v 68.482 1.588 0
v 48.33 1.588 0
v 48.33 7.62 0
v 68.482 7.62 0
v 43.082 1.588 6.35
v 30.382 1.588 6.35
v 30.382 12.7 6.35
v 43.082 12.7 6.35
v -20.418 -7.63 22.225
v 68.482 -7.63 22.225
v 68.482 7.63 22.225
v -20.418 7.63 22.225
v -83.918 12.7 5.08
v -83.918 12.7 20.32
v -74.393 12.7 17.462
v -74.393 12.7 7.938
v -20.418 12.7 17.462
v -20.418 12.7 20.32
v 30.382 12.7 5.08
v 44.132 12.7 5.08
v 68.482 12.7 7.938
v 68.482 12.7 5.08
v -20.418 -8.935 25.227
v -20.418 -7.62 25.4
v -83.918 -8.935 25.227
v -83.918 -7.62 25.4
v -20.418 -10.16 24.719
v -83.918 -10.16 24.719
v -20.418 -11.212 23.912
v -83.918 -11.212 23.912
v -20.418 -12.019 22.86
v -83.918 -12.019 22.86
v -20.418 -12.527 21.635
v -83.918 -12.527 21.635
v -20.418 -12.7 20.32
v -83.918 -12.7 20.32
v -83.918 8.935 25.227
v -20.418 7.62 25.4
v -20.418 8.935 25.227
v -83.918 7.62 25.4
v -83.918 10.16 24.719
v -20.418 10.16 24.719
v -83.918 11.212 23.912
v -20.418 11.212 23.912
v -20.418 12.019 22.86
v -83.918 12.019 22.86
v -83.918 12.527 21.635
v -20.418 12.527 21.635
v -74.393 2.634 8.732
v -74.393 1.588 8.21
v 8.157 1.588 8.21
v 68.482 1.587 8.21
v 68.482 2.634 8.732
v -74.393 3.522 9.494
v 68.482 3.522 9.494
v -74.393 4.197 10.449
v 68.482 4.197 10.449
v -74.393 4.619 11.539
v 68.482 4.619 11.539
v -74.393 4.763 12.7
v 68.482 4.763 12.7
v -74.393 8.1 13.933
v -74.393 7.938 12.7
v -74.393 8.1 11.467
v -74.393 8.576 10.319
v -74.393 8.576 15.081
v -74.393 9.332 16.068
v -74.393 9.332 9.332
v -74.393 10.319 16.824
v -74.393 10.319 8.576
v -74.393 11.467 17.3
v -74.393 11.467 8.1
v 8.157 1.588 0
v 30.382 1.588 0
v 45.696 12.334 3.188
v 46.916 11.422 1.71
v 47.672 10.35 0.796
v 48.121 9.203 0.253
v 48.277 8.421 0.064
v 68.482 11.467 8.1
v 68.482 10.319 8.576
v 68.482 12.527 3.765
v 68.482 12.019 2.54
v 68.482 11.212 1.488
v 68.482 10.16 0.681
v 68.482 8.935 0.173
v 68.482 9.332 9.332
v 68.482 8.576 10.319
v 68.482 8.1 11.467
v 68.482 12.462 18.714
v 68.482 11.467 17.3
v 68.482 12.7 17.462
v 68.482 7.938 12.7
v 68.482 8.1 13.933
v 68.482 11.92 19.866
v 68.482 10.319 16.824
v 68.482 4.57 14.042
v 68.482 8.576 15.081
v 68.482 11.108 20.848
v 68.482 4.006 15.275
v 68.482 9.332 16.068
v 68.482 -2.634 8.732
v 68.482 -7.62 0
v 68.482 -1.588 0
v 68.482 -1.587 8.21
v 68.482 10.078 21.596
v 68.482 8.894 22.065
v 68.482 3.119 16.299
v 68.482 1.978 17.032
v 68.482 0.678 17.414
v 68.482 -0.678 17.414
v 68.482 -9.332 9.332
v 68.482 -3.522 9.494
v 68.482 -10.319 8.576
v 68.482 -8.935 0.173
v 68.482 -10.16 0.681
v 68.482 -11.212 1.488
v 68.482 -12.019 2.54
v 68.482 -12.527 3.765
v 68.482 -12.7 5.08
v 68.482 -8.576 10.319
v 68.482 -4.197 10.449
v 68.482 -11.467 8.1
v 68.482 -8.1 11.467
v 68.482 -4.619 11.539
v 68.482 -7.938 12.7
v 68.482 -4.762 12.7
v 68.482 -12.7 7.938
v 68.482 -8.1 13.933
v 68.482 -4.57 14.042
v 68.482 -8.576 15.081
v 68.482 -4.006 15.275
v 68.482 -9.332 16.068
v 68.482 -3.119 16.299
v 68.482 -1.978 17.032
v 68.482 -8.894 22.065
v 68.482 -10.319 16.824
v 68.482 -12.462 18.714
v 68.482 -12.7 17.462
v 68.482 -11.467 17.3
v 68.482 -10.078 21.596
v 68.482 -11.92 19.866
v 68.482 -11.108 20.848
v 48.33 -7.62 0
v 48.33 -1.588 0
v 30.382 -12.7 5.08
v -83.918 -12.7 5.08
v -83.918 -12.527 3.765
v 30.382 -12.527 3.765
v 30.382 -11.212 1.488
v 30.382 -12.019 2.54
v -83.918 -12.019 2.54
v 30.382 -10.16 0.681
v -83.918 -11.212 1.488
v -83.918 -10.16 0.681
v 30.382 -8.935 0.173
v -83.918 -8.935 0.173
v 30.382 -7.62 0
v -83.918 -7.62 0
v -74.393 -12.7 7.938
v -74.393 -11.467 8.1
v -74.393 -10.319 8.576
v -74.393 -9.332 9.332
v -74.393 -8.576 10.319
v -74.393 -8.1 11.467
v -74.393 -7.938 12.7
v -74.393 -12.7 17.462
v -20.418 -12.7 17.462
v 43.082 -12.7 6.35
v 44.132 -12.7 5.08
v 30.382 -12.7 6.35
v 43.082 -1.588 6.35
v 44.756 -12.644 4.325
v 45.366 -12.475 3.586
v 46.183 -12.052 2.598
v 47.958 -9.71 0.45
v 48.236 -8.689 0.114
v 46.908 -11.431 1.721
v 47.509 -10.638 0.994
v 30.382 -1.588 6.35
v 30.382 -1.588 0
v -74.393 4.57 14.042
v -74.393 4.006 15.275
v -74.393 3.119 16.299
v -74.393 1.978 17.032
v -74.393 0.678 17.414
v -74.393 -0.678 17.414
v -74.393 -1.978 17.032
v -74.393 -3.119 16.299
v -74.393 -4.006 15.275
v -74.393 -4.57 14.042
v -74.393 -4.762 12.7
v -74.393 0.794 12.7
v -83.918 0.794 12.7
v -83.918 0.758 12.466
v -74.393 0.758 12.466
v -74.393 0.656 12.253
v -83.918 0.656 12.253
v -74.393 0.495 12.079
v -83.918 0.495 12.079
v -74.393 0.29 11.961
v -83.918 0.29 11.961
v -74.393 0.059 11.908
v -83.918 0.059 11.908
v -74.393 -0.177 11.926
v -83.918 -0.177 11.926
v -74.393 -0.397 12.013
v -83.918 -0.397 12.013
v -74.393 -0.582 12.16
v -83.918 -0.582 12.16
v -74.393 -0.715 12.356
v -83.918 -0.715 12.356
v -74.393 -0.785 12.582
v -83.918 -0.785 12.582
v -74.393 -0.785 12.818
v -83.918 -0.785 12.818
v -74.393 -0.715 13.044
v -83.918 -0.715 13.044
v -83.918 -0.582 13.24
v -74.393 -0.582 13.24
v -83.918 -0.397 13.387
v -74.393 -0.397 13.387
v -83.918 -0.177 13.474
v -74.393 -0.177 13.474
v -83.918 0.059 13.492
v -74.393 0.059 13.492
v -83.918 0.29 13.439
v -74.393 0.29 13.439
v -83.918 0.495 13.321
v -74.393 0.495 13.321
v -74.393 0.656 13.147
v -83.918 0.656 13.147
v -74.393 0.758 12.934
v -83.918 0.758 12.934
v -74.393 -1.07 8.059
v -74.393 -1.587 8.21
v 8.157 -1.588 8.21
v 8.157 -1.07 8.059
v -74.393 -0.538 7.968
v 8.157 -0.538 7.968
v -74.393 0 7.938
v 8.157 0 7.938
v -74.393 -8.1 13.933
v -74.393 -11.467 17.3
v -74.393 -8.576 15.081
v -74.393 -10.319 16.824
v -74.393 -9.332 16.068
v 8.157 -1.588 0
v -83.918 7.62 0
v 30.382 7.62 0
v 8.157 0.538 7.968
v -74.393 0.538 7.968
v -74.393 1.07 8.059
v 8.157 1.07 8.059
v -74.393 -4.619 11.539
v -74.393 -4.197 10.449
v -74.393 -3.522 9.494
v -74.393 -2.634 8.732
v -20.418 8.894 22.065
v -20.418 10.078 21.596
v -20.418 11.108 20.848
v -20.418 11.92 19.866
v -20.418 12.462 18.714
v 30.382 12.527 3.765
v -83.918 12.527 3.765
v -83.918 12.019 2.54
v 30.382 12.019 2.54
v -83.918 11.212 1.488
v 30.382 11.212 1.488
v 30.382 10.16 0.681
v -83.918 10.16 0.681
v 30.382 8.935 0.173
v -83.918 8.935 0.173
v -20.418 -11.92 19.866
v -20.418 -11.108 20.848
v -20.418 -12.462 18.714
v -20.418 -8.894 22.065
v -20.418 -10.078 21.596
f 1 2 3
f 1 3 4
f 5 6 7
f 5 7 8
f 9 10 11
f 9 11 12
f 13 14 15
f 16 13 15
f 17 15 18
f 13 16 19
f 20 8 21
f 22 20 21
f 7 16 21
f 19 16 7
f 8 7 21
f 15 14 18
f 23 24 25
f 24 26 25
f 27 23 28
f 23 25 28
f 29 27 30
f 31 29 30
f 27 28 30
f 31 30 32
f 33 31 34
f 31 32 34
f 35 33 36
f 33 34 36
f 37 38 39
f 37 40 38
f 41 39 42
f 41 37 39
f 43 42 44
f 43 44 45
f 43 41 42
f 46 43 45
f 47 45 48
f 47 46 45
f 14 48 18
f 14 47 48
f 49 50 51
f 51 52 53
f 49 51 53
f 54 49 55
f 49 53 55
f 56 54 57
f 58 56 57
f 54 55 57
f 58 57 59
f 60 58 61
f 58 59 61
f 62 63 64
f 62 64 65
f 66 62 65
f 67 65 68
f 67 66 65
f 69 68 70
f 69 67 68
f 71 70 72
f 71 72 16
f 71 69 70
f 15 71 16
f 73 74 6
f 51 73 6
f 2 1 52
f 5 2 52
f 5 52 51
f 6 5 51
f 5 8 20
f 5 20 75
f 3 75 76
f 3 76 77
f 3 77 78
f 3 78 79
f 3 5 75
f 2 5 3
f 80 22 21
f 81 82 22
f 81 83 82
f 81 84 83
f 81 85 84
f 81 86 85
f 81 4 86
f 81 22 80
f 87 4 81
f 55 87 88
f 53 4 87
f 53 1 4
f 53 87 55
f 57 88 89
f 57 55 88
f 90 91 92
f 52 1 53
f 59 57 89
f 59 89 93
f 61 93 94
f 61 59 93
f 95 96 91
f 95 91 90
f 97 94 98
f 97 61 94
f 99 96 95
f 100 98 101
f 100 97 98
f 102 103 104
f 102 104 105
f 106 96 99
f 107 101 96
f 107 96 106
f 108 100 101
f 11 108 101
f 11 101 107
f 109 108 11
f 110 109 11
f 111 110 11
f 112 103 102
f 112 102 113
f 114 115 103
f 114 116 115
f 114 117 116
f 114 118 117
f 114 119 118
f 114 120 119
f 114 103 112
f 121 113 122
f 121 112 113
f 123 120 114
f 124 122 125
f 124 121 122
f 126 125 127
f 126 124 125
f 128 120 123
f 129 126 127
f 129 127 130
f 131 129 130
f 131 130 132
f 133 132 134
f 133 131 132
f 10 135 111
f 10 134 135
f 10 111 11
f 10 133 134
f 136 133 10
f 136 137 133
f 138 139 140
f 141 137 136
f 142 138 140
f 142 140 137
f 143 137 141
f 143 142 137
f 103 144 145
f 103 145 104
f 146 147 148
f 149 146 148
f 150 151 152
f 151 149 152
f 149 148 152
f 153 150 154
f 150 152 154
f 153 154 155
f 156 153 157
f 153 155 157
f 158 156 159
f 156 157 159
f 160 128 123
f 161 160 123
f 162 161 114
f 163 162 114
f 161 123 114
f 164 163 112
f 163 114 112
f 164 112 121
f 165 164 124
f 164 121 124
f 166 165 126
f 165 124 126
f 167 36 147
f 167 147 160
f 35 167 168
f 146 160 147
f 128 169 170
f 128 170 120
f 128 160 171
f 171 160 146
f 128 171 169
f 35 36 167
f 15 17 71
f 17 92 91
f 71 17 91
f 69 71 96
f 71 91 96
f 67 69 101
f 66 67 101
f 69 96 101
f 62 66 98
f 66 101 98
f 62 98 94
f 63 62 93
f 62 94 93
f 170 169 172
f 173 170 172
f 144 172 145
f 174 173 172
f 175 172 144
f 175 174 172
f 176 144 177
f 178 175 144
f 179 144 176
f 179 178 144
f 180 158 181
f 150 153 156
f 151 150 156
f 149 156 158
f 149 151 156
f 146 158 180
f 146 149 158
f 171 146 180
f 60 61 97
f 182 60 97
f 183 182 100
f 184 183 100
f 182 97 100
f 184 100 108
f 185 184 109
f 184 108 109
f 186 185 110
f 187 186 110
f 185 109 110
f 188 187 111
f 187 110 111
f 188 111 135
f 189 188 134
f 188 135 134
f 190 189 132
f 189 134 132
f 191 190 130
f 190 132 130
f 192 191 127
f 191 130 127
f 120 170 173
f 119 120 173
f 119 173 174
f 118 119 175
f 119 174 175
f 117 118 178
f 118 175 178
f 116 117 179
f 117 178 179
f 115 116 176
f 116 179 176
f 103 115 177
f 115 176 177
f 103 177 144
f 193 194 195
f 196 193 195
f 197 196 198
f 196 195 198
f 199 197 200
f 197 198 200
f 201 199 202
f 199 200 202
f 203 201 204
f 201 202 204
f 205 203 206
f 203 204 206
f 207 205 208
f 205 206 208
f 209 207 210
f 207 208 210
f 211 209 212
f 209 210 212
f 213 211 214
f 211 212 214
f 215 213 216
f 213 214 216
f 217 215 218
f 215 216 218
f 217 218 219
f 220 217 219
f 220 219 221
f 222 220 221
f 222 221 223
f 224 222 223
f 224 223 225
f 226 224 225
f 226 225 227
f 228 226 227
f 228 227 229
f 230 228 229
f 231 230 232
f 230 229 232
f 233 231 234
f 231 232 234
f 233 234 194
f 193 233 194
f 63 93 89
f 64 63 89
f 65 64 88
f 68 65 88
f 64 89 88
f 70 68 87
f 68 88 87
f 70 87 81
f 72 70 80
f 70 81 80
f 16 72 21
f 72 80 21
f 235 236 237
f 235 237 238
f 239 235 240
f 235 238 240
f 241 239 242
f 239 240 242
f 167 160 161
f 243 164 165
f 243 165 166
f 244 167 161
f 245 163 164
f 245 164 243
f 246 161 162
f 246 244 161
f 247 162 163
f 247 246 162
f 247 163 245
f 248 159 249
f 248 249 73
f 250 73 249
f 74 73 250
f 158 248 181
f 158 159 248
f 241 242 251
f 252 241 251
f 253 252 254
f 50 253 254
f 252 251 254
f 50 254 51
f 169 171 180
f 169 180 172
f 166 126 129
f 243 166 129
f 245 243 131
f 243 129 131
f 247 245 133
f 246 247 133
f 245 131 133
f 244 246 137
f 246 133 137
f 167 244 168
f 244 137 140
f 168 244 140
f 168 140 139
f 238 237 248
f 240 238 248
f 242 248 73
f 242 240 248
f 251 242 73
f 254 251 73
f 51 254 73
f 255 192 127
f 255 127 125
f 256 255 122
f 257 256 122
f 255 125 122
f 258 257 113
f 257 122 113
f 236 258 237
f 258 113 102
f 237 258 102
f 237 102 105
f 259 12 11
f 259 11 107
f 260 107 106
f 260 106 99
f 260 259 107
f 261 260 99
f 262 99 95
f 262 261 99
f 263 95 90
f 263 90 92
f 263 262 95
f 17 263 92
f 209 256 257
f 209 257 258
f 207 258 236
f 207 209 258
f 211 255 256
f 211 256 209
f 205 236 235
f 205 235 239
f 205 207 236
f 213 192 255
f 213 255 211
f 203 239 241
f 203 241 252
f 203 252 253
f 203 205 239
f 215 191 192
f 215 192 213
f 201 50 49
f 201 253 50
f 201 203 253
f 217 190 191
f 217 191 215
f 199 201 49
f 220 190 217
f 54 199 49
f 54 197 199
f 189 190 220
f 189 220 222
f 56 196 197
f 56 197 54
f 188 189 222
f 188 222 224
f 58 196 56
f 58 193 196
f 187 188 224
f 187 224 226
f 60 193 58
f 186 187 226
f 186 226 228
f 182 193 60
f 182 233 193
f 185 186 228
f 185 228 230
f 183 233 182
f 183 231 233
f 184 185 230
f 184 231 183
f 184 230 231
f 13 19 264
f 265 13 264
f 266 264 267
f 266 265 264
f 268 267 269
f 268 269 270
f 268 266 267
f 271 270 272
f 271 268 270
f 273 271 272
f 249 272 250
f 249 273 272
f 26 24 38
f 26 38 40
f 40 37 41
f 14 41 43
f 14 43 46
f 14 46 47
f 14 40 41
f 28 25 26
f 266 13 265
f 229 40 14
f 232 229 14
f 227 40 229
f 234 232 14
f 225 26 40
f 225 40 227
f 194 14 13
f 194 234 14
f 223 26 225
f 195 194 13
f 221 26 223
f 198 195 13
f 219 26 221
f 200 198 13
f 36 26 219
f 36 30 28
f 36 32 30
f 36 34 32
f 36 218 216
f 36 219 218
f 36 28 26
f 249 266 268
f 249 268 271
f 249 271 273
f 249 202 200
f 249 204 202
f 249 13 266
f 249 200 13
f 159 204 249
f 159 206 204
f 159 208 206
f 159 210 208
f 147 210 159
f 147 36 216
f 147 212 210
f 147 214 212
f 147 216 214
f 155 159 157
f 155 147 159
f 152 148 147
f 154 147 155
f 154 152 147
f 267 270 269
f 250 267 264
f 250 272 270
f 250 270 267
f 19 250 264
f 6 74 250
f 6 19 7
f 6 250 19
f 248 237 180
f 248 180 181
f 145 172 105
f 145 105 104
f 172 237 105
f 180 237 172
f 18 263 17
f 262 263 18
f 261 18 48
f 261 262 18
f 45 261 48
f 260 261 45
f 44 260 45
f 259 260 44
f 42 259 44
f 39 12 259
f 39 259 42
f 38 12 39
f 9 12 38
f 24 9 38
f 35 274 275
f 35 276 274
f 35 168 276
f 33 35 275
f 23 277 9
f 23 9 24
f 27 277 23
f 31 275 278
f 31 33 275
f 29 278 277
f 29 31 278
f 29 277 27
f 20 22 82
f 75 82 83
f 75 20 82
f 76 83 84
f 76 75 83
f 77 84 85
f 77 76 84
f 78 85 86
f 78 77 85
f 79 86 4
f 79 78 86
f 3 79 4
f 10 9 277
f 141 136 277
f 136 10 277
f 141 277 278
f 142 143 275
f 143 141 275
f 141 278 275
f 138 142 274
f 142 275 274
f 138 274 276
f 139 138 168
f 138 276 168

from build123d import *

# Parameters (mm, degrees)
F0_W        = 142.875
F0_H        = 9.525
F1_DEPTH    = 12.7
F3_DEPTH    = 142.875
F5_DEPTH    = 9.525
F6_DEPTH    = 142.875
F7_T1_DEPTH = 101.5751710417
F7_T3_DEPTH = 45.552419836
F7_T5_DEPTH = 139.7
F8_R        = 5.08
F9_DEPTH    = 60.325


# Not quite as in the source:
# - a fillet or chamfer that OpenCascade refuses, or shapes differently, is made with other operations: its cross-section is extruded or revolved along the edge and cut away or added


with BuildPart() as f1:
    # F0 (on Front) → F1 (new body, symmetric)
    with BuildSketch(Plane.XZ):
        Polygon((-20.4177256674, 25.4), (-83.9177256674, 25.4), (-83.9177256674, 0), (30.3822743326, 0), (30.3822743326, 6.35), (43.0822743326, 6.35), (48.3298544966, 0), (68.4822743326, 0), (68.4822743326, 7.9375), (-74.3927256674, 7.9375), (-74.3927256674, 17.4625), (68.4822743326, 17.4625), (68.4822743326, 22.225), (-20.4177256674, 22.225), align=None)
        with Locations((-2.9552256674, 12.7)):
            Rectangle(F0_W, F0_H)
    extrude(amount=F1_DEPTH, both=True)

    # F2 (on face) → F3 (cut)
    with BuildSketch(Plane.YZ.offset(68.4822743326)):
        with BuildLine():
            Line((-4.7625, 12.7), (0, 12.7))
            Line((0, 12.7), (4.7625, 12.7))
            ThreePointArc((4.7625, 12.7), (0, 17.4625), (-4.7625, 12.7))
        make_face()
        with BuildLine():
            Line((-1.5875, 8.2098719395), (0, 8.2098719395))
            Line((0, 8.2098719395), (0, 12.7))
            Line((0, 12.7), (-4.7625, 12.7))
            ThreePointArc((-4.7625, 12.7), (-3.8885649667, 9.950369343), (-1.5875, 8.2098719395))
        make_face()
        with BuildLine():
            ThreePointArc((-1.5875, 8.2098719395), (-0.8053481737, 8.0060868597), (0, 7.9375))
            Line((0, 7.9375), (0, 8.2098719395))
            Line((0, 8.2098719395), (-1.5875, 8.2098719395))
        make_face()
        with BuildLine():
            Line((0, 8.2098719395), (0, 7.9375))
            ThreePointArc((0, 7.9375), (0.8053481737, 8.0060868597), (1.5875, 8.2098719395))
            Line((1.5875, 8.2098719395), (0, 8.2098719395))
        make_face()
        with BuildLine():
            Line((0, 12.7), (0, 8.2098719395))
            Line((0, 8.2098719395), (1.5875, 8.2098719395))
            ThreePointArc((1.5875, 8.2098719395), (3.8885649667, 9.950369343), (4.7625, 12.7))
            Line((4.7625, 12.7), (0, 12.7))
        make_face()
    extrude(amount=-F3_DEPTH, mode=Mode.SUBTRACT)

    # F4 (on face) → F5 (cut)
    with BuildSketch(Plane(origin=(-83.9177256674, 0, 0), x_dir=(0, -1, 0), z_dir=(-1, 0, 0))):
        with BuildLine():
            Line((-0.79375, 12.7), (0.79375, 12.7))
            ThreePointArc((0.79375, 12.7), (0, 13.49375), (-0.79375, 12.7))
        make_face()
        with BuildLine():
            ThreePointArc((-0.79375, 12.7), (0, 11.90625), (0.79375, 12.7))
            Line((0.79375, 12.7), (-0.79375, 12.7))
        make_face()
    extrude(amount=-F5_DEPTH, mode=Mode.SUBTRACT)

    # F2 (on face) → F6 (cut)
    with BuildSketch(Plane.YZ.offset(68.4822743326)):
        with BuildLine():
            ThreePointArc((12.7, 17.4625), (9.3324039546, 16.0675960454), (7.9375, 12.7))
            Line((7.9375, 12.7), (12.7, 12.7))
            Line((12.7, 12.7), (12.7, 17.4625))
        make_face()
        with BuildLine():
            ThreePointArc((7.9375, 12.7), (9.3324039546, 9.3324039546), (12.7, 7.9375))
            Line((12.7, 7.9375), (12.7, 12.7))
            Line((12.7, 12.7), (7.9375, 12.7))
        make_face()
        with BuildLine():
            Line((-12.7, 12.7), (-12.7, 7.9375))
            ThreePointArc((-12.7, 7.9375), (-9.3324039546, 9.3324039546), (-7.9375, 12.7))
            Line((-7.9375, 12.7), (-12.7, 12.7))
        make_face()
        with BuildLine():
            Line((-12.7, 12.7), (-7.9375, 12.7))
            ThreePointArc((-7.9375, 12.7), (-9.3324039546, 16.0675960454), (-12.7, 17.4625))
            Line((-12.7, 17.4625), (-12.7, 12.7))
        make_face()
    extrude(amount=-F6_DEPTH, mode=Mode.SUBTRACT)

    # F7: fillet of radius 5.08 on 6 edges, made by hand

    # F7_s2 → F7_t1 (cut)
    with BuildSketch(Plane.YZ.offset(-20.4177256674)):
        with BuildLine():
            ThreePointArc((7.6299315833, 22.225), (11.1079698235, 20.8476544532), (12.7, 17.4625))
            Line((12.7, 17.4625), (12.7, 22.225))
            Line((12.7, 22.225), (7.6299315833, 22.225))
        make_face()
        with BuildLine():
            ThreePointArc((-7.6299315833, 22.225), (-11.1079698235, 20.8476544532), (-12.7, 17.4625))
            Line((-12.7, 17.4625), (-12.7, 22.225))
            Line((-12.7, 22.225), (-7.6299315833, 22.225))
        make_face()
    extrude(amount=F7_T1_DEPTH, mode=Mode.SUBTRACT)

    # F7_s4 → F7_t3 (cut)
    with BuildSketch(Plane.YZ.offset(35.6298544966)):
        with BuildLine():
            ThreePointArc((12.7, 5.08), (11.2121024484, 1.4878975516), (7.62, 0))
            Line((7.62, 0), (12.7, 0))
            Line((12.7, 0), (12.7, 5.08))
        make_face()
        with BuildLine():
            ThreePointArc((-12.7, 5.08), (-11.2121024484, 1.4878975516), (-7.62, 0))
            Line((-7.62, 0), (-12.7, 0))
            Line((-12.7, 0), (-12.7, 5.08))
        make_face()
    extrude(amount=F7_T3_DEPTH, mode=Mode.SUBTRACT)

    # F7_s6 → F7_t5 (cut)
    with BuildSketch(Plane.YZ.offset(-96.6177256674)):
        with BuildLine():
            ThreePointArc((-12.7, 5.08), (-11.2121024484, 1.4878975516), (-7.62, 0))
            Line((-7.62, 0), (-12.7, 0))
            Line((-12.7, 0), (-12.7, 5.08))
        make_face()
        with BuildLine():
            ThreePointArc((12.7, 5.08), (11.2121024484, 1.4878975516), (7.62, 0))
            Line((7.62, 0), (12.7, 0))
            Line((12.7, 0), (12.7, 5.08))
        make_face()
    extrude(amount=F7_T5_DEPTH, mode=Mode.SUBTRACT)

    # F8
    f8_edges = [f1.edges().sort_by_distance(p)[0] for p in [
        (-52.167726, 12.7, 25.4),
        (-52.167726, -12.7, 25.4),
    ]]
    fillet(f8_edges, radius=F8_R)

    # F2 (on face) → F9 (cut)
    with BuildSketch(Plane.YZ.offset(68.4822743326)):
        with BuildLine():
            Line((0, 7.9375), (0, 0))
            Line((0, 0), (1.5875, 0))
            Line((1.5875, 0), (1.5875, 8.2098719395))
            ThreePointArc((1.5875, 8.2098719395), (0.8053481737, 8.0060868597), (0, 7.9375))
        make_face()
        with BuildLine():
            Line((-1.5875, 0), (0, 0))
            Line((0, 0), (0, 7.9375))
            ThreePointArc((0, 7.9375), (-0.8053481737, 8.0060868597), (-1.5875, 8.2098719395))
            Line((-1.5875, 8.2098719395), (-1.5875, 0))
        make_face()
    extrude(amount=-F9_DEPTH, mode=Mode.SUBTRACT)


solid = f1.part
